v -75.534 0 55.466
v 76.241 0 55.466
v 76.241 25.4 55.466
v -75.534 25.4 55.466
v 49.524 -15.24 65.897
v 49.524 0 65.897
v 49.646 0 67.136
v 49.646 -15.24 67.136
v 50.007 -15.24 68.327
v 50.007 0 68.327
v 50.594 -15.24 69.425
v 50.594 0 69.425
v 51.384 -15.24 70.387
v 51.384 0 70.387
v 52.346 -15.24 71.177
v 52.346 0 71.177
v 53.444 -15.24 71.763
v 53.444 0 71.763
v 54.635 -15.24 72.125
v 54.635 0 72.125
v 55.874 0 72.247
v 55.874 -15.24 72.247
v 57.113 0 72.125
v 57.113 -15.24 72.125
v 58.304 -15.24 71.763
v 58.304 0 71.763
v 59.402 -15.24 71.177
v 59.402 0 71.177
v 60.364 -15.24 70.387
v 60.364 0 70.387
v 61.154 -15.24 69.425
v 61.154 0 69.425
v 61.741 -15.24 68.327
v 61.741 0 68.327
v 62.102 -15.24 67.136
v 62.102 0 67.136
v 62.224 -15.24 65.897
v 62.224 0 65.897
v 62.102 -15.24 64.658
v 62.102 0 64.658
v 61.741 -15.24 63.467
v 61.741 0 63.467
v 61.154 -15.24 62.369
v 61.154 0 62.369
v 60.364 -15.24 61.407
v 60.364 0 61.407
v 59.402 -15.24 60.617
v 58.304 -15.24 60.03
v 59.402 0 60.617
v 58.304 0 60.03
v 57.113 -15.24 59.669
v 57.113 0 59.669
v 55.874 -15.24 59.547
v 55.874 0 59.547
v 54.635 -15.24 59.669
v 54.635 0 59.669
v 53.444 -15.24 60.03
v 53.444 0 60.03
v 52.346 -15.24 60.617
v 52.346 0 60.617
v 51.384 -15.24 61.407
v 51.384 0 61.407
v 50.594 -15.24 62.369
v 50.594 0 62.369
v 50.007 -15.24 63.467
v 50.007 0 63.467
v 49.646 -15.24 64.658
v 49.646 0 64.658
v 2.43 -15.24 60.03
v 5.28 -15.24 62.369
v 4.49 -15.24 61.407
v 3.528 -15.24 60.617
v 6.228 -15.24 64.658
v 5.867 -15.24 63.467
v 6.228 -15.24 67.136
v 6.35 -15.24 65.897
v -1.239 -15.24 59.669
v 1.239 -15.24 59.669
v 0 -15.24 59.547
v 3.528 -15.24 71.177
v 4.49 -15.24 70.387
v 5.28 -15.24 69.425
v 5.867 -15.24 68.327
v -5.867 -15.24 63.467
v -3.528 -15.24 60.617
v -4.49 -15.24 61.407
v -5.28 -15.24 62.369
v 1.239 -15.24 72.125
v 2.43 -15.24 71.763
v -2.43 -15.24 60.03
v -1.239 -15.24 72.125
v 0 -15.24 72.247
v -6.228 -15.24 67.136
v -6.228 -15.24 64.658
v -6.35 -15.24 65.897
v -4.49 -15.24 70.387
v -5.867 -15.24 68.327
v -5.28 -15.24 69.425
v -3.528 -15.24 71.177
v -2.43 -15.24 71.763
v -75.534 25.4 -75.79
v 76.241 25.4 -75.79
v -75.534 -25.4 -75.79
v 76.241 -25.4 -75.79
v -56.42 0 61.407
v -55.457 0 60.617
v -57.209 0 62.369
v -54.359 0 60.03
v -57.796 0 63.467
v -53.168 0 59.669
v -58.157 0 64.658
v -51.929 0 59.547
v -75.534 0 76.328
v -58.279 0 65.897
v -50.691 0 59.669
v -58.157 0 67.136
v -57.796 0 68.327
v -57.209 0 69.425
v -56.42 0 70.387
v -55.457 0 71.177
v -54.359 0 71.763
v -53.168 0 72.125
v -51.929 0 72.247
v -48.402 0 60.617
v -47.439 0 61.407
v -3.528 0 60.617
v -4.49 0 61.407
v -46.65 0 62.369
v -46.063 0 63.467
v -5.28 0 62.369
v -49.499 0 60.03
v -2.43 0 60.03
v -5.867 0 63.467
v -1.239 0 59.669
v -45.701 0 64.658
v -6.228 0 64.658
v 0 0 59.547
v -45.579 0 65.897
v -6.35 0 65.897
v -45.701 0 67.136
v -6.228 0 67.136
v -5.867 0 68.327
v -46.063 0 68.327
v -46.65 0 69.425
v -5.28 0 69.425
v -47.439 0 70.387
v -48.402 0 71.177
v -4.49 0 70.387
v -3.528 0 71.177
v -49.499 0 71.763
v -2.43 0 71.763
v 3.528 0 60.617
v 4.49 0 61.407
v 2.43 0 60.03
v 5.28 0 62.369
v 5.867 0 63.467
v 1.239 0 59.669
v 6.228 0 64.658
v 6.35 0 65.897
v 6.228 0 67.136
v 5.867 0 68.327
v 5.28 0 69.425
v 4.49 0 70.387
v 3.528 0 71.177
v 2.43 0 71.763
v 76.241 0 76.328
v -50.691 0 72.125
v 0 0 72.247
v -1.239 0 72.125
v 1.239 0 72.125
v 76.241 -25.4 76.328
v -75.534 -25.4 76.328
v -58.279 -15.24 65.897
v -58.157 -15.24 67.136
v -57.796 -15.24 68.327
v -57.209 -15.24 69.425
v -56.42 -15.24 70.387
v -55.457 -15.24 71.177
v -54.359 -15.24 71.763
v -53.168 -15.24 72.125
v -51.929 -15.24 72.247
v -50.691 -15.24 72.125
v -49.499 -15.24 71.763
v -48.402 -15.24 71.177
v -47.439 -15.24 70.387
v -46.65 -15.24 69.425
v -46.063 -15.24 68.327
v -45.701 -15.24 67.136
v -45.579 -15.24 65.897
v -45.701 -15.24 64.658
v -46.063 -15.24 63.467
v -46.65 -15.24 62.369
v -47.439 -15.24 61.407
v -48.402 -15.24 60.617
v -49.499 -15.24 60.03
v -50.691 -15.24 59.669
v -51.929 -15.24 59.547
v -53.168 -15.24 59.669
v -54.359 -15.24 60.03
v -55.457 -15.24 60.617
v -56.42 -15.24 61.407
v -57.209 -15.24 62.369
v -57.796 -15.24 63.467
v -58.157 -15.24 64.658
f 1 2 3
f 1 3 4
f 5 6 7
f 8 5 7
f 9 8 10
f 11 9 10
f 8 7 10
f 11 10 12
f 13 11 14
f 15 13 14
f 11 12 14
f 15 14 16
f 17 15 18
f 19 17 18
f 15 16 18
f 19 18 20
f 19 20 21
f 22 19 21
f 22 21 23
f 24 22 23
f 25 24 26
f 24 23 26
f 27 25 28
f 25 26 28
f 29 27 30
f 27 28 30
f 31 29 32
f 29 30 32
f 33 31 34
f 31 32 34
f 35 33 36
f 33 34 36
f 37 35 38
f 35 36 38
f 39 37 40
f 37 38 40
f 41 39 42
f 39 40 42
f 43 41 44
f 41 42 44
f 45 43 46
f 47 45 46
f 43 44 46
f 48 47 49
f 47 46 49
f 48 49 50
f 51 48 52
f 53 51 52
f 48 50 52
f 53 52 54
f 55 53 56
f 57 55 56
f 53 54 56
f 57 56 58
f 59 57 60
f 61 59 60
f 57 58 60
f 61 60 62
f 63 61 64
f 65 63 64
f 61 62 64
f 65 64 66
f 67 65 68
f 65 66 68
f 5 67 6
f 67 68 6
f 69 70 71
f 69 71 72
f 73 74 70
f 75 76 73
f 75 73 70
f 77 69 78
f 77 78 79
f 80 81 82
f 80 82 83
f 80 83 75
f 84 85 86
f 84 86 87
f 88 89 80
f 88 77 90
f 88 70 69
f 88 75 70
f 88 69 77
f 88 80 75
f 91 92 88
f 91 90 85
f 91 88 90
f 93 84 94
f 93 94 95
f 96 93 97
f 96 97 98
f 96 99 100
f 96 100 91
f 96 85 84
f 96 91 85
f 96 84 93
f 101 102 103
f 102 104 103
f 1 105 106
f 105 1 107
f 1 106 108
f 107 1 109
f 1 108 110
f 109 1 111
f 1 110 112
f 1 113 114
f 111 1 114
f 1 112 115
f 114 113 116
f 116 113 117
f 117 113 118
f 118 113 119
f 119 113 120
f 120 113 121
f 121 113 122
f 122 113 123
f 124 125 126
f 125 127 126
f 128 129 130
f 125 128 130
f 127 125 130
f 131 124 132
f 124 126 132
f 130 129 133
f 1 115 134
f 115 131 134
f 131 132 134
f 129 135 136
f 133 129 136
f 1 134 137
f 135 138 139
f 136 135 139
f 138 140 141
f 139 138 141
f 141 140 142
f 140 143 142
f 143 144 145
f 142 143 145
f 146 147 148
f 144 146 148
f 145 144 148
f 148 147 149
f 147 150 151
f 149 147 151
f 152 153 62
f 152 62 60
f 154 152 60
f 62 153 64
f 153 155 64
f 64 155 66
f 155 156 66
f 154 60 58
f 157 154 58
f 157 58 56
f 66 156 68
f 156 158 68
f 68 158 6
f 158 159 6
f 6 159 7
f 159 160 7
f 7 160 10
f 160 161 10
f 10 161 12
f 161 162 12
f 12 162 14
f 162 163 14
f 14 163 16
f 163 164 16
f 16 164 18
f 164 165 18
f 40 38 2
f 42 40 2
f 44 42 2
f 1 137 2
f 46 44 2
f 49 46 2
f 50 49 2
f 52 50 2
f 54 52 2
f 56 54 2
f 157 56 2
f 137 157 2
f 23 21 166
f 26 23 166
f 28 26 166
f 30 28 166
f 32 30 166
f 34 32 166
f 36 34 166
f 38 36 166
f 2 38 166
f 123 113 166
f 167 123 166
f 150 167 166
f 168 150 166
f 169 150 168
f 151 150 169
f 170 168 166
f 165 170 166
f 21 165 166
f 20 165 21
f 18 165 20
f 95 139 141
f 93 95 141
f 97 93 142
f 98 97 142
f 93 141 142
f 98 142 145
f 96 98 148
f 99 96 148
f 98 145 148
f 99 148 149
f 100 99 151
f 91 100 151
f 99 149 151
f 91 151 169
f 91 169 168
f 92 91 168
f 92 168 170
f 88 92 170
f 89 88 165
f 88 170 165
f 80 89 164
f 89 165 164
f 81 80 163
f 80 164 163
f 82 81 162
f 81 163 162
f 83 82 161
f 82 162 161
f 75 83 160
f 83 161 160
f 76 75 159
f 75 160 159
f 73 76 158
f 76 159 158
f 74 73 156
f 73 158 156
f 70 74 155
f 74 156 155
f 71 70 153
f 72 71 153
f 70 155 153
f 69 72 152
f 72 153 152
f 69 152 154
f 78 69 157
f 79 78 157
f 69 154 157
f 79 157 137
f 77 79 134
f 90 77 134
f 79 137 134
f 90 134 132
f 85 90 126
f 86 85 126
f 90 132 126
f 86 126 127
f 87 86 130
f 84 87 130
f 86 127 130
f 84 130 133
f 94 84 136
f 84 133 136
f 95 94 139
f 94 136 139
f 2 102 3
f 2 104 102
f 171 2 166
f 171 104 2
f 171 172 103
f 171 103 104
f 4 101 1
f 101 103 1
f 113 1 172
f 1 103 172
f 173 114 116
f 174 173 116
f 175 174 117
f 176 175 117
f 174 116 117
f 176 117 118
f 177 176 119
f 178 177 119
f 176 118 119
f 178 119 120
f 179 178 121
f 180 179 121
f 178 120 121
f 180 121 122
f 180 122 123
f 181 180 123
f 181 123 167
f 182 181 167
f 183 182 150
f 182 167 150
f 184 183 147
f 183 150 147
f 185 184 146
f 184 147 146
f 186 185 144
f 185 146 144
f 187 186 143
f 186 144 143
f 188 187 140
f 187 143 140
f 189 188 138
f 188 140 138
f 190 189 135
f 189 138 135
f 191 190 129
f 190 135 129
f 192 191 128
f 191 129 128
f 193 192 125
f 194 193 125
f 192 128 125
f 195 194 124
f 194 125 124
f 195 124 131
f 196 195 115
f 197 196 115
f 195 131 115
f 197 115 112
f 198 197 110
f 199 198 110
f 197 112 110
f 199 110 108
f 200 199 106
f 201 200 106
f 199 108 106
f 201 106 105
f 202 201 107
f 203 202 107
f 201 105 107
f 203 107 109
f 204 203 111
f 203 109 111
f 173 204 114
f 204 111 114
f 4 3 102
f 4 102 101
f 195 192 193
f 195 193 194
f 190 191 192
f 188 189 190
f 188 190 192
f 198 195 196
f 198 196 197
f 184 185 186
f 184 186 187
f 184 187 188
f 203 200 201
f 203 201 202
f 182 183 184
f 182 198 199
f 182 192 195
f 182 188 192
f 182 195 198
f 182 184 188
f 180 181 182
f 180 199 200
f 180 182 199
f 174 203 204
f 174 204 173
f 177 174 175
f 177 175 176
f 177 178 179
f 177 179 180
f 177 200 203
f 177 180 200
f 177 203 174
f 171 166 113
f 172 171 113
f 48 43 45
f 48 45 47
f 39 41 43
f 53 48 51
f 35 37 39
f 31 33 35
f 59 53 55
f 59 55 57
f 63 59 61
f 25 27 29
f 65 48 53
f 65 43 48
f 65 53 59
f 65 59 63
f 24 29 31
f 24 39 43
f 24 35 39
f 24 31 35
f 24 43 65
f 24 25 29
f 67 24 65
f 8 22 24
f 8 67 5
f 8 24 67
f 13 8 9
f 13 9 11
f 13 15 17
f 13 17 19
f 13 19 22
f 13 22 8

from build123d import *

# Parameters (mm, degrees)
F1_DEPTH = 25.4
F2_W     = 151.775382
F2_H     = 131.256286
F3_DEPTH = 25.4
F4_R     = 6.35
F5_DEPTH = 15.24


with BuildPart() as f1:
    # F0 (on Front) → F1 (new body)
    with BuildSketch(Plane.XZ):
        Polygon((-75.533889, 76.327696), (-75.533889, 61.938155), (-75.533889, -75.790301), (72.815411, -75.790301), (76.241493, -75.790301), (76.241493, 76.327696), align=None)
    extrude(amount=F1_DEPTH)

    # F2 (on face) → F3 (join)
    with BuildSketch(Plane(origin=(0, 0, 0), x_dir=(-1, 0, 0), z_dir=(0, 1, 0))):
        with Locations((-0.353802, -10.162158)):
            Rectangle(F2_W, F2_H)
    extrude(amount=F3_DEPTH)

    # F4 (on face) → F5 (cut)
    with BuildSketch(Plane(origin=(0, 0, 0), x_dir=(-1, 0, 0), z_dir=(0, 1, 0))):
        with Locations((-55.87405, 65.896841)):
            Circle(F4_R)
        with Locations((0, 65.896851)):
            Circle(F4_R)
        with Locations((51.929399, 65.896851)):
            Circle(F4_R)
    extrude(amount=-F5_DEPTH, mode=Mode.SUBTRACT)


solid = f1.part
